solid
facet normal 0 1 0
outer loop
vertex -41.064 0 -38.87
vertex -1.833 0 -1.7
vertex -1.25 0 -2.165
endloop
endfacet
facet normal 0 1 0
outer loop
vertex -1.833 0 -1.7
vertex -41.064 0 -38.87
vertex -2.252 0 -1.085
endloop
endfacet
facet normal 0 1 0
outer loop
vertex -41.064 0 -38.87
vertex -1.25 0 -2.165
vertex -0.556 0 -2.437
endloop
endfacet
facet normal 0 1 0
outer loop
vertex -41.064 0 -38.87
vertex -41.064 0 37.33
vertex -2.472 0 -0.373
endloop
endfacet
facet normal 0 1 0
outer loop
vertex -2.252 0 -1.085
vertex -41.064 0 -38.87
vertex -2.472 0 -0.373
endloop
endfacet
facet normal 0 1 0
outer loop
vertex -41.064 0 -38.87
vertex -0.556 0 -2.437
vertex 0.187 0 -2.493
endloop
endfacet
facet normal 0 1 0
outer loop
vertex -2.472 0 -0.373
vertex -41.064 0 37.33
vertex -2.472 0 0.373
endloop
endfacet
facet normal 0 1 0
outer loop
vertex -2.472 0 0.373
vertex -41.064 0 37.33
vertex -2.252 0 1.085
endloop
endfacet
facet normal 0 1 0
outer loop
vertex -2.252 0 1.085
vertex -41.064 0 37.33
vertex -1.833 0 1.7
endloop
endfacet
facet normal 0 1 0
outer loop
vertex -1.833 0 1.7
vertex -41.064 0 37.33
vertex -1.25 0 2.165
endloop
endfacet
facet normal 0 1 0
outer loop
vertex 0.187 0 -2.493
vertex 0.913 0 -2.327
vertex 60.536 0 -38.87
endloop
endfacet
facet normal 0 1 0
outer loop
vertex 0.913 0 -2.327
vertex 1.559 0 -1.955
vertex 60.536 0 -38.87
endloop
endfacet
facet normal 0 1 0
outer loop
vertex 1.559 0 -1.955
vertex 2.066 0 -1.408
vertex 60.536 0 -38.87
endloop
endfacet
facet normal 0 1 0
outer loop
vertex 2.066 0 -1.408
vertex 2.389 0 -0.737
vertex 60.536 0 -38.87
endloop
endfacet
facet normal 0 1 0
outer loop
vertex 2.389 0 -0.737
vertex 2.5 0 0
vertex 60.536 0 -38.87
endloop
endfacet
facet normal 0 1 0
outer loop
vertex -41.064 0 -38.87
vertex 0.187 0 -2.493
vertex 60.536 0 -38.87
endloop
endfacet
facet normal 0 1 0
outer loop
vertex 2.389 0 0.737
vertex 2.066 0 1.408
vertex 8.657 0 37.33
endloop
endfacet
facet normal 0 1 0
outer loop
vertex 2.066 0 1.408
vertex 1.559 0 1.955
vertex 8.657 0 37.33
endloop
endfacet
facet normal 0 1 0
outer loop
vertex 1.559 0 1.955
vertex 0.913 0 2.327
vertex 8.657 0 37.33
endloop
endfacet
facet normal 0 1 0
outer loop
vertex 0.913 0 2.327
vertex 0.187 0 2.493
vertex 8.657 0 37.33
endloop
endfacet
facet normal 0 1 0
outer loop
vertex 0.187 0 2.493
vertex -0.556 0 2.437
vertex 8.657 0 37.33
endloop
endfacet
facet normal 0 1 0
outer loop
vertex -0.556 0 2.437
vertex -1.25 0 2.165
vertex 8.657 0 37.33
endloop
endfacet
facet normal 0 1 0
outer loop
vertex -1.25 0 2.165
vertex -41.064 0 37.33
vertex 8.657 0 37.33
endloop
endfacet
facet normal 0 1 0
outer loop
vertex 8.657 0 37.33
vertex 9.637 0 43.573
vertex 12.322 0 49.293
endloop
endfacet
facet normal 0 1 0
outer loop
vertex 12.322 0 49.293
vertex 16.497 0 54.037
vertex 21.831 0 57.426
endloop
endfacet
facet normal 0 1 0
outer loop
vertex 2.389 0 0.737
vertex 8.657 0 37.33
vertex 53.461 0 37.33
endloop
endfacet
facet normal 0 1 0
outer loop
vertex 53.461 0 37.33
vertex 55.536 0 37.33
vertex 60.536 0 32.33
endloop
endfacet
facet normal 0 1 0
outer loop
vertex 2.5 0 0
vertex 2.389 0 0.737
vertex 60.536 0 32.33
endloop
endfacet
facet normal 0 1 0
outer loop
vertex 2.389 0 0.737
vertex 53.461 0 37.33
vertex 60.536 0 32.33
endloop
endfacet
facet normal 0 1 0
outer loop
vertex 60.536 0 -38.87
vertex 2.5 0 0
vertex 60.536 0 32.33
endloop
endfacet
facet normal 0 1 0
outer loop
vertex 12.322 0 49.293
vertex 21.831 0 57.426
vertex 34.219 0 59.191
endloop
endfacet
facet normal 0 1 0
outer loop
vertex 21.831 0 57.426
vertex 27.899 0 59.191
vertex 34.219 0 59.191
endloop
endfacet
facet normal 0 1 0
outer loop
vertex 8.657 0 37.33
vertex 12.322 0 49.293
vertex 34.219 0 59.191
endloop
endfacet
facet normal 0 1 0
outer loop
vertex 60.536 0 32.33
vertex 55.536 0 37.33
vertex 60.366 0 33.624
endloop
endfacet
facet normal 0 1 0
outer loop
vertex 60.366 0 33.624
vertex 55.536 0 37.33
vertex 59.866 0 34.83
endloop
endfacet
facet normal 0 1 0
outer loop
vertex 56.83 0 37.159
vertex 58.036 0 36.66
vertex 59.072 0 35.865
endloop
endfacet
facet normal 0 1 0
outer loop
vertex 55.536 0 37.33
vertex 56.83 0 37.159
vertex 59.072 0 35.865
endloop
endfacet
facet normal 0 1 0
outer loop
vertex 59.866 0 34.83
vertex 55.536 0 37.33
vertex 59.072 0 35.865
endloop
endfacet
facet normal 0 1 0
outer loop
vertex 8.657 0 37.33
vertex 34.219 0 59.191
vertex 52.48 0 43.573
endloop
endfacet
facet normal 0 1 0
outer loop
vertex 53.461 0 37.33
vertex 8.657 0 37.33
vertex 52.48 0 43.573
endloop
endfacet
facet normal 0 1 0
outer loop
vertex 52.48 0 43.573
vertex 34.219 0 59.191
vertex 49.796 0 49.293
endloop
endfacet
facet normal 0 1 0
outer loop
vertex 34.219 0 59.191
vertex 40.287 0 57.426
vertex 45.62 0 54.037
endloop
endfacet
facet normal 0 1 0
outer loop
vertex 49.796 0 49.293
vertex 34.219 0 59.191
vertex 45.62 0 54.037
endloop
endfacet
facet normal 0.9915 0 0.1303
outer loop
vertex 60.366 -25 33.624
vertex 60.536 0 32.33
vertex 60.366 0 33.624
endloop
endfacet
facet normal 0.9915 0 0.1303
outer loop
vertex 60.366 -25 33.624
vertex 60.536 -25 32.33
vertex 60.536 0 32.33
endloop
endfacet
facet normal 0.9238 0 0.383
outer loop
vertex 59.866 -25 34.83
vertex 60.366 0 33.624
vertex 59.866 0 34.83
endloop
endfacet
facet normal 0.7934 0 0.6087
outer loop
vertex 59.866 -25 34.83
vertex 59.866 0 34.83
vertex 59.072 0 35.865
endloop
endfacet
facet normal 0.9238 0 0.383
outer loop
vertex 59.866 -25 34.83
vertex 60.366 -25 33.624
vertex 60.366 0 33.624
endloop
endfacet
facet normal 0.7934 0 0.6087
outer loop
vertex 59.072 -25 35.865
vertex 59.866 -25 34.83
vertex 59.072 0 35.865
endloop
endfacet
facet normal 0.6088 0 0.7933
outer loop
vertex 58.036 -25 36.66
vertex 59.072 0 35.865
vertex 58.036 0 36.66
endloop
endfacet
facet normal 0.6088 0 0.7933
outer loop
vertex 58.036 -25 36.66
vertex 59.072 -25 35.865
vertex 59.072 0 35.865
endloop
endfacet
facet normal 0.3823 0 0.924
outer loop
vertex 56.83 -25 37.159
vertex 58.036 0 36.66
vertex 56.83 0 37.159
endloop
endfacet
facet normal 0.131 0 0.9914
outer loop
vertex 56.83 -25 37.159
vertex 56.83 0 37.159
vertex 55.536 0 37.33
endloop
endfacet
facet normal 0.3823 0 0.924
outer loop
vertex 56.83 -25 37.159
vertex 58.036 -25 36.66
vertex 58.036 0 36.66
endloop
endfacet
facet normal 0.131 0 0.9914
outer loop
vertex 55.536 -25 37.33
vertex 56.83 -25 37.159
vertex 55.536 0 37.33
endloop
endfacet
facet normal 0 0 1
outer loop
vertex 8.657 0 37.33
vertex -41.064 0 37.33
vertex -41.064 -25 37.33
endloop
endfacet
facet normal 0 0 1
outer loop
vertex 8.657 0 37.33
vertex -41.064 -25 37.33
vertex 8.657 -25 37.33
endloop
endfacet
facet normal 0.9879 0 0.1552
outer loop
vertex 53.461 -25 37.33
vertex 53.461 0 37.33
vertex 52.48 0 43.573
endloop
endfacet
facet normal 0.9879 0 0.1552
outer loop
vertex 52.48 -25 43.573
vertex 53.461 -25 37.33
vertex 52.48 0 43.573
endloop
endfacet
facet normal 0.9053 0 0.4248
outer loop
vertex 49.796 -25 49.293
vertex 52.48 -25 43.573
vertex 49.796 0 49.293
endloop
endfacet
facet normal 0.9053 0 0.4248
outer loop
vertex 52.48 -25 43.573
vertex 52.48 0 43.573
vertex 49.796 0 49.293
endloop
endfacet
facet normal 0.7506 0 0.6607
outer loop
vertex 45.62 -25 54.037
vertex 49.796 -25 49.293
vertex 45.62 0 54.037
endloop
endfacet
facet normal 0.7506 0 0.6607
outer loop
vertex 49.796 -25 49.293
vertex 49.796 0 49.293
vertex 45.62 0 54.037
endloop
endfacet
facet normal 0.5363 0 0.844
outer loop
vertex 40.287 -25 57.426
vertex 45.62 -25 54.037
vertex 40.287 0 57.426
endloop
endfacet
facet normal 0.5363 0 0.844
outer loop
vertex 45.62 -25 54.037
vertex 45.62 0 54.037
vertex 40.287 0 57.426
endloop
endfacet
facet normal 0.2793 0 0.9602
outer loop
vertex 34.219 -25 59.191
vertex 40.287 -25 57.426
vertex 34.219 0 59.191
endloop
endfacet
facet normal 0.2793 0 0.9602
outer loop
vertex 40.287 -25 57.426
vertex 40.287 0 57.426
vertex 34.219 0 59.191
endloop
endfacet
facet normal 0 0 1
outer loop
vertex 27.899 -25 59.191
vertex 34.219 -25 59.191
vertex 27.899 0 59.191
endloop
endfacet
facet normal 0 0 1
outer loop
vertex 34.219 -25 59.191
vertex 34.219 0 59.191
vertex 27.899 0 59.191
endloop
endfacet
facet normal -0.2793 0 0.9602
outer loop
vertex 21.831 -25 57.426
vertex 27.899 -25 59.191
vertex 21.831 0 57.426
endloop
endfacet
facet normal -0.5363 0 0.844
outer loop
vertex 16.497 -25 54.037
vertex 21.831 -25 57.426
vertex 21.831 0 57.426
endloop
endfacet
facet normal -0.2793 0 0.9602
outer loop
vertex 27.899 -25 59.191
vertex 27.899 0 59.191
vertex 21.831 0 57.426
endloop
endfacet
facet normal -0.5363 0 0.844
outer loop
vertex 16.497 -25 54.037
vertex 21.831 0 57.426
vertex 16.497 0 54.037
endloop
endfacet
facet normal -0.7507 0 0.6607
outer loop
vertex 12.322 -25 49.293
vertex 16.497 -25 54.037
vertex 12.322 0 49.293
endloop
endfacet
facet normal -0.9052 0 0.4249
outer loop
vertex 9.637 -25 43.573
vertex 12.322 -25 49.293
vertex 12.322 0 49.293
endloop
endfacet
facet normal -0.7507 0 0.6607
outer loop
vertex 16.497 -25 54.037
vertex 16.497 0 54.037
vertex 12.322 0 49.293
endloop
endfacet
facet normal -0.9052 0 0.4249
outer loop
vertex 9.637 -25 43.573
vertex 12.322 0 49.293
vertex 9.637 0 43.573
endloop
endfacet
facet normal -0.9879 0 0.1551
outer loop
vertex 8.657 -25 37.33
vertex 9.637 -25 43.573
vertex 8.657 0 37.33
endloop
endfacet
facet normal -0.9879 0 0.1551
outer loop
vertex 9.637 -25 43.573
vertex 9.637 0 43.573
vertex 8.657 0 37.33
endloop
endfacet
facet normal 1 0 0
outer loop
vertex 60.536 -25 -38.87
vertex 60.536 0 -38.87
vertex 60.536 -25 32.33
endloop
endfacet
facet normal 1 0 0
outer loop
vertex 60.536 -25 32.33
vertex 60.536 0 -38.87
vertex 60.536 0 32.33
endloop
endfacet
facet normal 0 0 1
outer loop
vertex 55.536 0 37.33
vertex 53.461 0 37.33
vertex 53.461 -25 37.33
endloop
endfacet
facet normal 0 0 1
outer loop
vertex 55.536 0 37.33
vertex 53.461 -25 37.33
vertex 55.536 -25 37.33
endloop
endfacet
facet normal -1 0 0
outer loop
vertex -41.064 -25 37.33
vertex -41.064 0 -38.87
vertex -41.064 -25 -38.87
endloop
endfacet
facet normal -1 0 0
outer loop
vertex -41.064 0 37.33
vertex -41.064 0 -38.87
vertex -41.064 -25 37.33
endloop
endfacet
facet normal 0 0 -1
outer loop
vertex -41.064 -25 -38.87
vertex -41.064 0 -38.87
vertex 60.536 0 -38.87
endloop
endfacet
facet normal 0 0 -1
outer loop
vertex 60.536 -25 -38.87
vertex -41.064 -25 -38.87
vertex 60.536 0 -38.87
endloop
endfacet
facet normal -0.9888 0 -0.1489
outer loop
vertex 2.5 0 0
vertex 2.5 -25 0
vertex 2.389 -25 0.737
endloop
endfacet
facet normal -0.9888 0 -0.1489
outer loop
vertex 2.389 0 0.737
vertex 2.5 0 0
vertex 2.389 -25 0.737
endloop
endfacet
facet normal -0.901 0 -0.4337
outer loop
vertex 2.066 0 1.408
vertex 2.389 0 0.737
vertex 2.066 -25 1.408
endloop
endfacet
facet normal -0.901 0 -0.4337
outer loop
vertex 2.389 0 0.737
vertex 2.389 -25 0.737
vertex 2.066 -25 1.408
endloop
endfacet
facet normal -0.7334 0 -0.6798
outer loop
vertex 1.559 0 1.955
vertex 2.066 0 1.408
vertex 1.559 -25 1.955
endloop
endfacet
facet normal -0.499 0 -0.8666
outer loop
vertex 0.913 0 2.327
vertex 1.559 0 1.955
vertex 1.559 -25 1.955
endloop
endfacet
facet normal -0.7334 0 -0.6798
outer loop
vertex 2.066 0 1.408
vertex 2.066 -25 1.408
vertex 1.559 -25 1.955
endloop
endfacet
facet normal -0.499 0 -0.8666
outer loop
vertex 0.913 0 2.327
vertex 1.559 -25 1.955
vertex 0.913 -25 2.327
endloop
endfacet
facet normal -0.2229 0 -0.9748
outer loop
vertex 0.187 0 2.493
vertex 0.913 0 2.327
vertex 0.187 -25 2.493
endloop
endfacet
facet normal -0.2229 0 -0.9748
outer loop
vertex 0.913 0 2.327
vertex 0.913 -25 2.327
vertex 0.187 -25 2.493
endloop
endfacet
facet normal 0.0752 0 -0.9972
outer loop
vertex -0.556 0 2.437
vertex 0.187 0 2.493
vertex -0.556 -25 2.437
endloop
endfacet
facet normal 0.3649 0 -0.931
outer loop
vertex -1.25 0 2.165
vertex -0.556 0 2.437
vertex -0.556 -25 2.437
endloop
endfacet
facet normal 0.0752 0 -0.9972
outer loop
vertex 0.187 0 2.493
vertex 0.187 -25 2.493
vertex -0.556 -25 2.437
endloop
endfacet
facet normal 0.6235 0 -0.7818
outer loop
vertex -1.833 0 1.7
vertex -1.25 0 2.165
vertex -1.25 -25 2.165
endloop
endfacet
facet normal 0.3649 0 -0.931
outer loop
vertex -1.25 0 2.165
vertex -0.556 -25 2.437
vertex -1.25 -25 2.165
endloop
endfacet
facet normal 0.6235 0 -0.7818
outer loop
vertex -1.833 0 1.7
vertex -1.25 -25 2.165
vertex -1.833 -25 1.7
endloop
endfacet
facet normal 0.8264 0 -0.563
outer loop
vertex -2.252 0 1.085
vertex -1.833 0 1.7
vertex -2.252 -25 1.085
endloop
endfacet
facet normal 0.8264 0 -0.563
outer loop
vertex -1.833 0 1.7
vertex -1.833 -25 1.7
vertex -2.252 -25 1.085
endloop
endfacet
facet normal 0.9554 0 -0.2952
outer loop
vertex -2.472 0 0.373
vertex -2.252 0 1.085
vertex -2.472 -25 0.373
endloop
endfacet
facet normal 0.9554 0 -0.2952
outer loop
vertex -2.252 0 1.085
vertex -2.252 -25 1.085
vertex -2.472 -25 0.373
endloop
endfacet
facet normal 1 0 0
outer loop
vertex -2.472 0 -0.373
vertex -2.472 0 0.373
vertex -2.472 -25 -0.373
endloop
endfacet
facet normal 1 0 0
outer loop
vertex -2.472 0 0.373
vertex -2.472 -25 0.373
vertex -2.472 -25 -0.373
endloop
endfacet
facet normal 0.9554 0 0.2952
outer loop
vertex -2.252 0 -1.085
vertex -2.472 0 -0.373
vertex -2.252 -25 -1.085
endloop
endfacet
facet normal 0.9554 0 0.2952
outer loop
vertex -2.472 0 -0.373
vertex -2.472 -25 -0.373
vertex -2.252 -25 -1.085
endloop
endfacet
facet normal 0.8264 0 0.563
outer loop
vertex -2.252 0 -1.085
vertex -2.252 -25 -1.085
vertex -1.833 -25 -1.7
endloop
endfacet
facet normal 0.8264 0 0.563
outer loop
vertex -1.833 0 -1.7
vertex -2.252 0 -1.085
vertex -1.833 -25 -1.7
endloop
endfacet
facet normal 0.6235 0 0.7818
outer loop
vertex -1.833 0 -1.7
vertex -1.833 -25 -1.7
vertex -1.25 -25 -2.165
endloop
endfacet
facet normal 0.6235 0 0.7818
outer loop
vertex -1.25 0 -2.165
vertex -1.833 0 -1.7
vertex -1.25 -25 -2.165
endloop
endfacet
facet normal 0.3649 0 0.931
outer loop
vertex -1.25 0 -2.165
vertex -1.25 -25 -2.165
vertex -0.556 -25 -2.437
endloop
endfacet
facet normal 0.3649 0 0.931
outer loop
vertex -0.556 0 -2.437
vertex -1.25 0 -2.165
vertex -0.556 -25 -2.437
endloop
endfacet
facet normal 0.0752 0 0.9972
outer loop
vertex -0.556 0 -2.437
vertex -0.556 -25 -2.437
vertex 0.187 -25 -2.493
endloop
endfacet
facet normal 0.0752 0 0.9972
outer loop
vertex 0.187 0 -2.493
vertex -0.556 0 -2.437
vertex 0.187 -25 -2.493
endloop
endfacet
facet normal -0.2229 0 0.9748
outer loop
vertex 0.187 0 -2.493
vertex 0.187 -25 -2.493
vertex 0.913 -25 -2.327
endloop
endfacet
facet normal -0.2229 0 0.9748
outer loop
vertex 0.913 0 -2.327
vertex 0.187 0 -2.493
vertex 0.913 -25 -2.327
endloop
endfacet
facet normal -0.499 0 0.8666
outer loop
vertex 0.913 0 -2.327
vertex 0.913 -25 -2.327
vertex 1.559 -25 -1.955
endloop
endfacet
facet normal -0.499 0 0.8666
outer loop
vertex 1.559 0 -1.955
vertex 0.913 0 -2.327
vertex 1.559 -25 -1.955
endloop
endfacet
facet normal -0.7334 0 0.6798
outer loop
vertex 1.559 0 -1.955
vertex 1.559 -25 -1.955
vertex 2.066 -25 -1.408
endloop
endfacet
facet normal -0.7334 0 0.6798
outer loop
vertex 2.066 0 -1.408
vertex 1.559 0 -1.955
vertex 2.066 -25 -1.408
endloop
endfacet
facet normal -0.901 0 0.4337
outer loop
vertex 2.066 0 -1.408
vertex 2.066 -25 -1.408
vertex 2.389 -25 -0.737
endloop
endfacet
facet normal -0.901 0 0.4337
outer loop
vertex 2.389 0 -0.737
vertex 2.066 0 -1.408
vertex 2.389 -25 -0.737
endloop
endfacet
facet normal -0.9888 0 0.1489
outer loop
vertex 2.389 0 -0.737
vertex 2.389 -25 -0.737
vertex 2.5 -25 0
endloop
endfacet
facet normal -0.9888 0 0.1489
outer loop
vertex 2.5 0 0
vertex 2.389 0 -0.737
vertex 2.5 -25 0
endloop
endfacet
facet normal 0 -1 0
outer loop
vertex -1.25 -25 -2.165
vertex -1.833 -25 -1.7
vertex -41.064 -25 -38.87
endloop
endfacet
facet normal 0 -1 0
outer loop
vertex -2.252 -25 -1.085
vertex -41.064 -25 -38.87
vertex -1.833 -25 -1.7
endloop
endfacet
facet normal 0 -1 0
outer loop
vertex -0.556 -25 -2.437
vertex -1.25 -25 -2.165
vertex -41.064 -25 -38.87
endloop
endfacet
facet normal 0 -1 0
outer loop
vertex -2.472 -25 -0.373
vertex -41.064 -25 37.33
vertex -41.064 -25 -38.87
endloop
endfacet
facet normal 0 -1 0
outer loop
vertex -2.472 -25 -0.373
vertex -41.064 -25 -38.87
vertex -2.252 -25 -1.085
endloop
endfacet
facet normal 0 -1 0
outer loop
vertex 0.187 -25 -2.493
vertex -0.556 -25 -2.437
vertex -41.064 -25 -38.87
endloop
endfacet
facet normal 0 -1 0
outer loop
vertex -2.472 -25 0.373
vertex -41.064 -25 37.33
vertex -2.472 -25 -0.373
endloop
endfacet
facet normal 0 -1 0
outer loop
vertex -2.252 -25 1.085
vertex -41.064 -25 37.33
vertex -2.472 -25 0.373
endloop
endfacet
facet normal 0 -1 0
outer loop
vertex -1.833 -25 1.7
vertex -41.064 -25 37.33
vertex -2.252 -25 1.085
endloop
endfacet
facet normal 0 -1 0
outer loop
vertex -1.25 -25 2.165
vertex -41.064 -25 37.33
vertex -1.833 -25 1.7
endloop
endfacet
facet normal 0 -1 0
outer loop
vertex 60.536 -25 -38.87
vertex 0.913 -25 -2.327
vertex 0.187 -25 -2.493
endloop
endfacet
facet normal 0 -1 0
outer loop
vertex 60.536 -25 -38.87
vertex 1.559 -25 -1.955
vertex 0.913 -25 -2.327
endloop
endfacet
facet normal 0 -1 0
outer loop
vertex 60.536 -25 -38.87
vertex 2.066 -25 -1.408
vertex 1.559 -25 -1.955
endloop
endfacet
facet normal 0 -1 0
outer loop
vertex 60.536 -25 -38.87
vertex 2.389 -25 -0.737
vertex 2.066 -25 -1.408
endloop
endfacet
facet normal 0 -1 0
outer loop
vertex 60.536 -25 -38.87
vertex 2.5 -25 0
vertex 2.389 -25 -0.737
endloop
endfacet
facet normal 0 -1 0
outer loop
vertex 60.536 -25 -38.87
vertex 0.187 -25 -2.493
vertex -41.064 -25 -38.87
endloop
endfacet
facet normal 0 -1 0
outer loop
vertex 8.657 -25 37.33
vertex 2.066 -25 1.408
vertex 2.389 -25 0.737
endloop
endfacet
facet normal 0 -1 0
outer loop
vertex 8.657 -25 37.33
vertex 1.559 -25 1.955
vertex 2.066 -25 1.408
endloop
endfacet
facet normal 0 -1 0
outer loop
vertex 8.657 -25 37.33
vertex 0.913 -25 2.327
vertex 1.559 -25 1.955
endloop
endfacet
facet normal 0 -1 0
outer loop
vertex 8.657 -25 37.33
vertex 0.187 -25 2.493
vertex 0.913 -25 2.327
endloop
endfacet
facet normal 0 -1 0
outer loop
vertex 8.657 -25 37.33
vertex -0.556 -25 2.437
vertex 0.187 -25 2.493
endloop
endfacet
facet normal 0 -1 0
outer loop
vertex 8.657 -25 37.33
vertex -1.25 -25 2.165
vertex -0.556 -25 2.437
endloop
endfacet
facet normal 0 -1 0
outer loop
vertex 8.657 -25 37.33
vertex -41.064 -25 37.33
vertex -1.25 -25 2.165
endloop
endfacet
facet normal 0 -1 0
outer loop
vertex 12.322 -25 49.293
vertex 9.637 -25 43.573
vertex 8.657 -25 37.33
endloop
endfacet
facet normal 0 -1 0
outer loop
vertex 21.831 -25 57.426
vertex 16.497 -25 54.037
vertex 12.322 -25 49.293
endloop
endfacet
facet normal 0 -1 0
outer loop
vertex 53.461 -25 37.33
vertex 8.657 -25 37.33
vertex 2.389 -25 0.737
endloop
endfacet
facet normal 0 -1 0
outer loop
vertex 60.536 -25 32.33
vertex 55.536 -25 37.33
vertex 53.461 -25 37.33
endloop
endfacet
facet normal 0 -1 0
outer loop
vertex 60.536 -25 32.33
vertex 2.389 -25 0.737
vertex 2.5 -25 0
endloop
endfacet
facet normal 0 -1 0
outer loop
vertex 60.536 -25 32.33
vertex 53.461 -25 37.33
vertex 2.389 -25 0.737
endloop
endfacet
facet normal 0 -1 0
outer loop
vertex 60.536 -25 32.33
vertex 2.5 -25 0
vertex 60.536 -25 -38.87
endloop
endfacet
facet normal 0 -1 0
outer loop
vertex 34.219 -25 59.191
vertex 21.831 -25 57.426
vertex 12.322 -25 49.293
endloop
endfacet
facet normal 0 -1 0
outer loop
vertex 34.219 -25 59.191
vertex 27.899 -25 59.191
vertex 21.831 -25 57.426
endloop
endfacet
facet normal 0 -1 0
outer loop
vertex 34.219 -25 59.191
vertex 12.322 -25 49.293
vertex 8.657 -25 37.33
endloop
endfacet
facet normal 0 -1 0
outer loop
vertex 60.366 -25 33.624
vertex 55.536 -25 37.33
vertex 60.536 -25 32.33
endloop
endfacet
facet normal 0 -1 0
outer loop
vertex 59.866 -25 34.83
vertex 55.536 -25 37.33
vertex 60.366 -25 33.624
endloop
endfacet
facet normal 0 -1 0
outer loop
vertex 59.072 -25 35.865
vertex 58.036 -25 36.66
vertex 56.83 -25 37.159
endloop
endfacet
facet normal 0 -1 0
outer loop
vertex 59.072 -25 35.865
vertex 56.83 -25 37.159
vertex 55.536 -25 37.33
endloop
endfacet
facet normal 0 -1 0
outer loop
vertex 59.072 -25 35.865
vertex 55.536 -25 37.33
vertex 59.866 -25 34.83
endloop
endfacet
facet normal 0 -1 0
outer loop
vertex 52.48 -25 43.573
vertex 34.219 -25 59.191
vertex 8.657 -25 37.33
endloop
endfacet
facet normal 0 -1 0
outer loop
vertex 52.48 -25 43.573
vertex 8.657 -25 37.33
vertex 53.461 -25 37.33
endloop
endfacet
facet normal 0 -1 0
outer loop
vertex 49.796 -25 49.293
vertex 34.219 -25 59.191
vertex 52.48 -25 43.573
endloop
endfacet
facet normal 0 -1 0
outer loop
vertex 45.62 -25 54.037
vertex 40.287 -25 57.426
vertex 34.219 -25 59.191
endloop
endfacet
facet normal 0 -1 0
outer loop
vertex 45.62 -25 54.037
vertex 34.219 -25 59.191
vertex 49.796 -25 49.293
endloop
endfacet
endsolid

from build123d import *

# Parameters (mm, degrees)
F0_W     = 101.6
F0_H     = 76.2
F1_DEPTH = 25
F2_R     = 5
F4_D     = 5
F5_R     = 22.404033
F6_DEPTH = 25


with BuildPart() as f1:
    # F0 (on Front) → F1 (new body)
    with BuildSketch(Plane.XZ):
        with Locations((9.736366, -0.770457)):
            Rectangle(F0_W, F0_H)
    extrude(amount=F1_DEPTH)

    # F2
    f2_edges = [f1.edges().sort_by_distance(p)[0] for p in [
        (60.536366, -12.5, 37.329543),
    ]]
    fillet(f2_edges, radius=F2_R)

    # F4 (through all)
    with Locations(Plane(origin=(0, 0, 0), x_dir=(-1, 0, 0), z_dir=(0, 1, 0))):
        with Locations((0, 0)):
            Hole(F4_D / 2)

    # F5 (on Front) → F6 (join)
    with BuildSketch(Plane.XZ):
        with Locations((31.058818, 37.010595)):
            Circle(F5_R)
    extrude(amount=F6_DEPTH)


solid = f1.part
